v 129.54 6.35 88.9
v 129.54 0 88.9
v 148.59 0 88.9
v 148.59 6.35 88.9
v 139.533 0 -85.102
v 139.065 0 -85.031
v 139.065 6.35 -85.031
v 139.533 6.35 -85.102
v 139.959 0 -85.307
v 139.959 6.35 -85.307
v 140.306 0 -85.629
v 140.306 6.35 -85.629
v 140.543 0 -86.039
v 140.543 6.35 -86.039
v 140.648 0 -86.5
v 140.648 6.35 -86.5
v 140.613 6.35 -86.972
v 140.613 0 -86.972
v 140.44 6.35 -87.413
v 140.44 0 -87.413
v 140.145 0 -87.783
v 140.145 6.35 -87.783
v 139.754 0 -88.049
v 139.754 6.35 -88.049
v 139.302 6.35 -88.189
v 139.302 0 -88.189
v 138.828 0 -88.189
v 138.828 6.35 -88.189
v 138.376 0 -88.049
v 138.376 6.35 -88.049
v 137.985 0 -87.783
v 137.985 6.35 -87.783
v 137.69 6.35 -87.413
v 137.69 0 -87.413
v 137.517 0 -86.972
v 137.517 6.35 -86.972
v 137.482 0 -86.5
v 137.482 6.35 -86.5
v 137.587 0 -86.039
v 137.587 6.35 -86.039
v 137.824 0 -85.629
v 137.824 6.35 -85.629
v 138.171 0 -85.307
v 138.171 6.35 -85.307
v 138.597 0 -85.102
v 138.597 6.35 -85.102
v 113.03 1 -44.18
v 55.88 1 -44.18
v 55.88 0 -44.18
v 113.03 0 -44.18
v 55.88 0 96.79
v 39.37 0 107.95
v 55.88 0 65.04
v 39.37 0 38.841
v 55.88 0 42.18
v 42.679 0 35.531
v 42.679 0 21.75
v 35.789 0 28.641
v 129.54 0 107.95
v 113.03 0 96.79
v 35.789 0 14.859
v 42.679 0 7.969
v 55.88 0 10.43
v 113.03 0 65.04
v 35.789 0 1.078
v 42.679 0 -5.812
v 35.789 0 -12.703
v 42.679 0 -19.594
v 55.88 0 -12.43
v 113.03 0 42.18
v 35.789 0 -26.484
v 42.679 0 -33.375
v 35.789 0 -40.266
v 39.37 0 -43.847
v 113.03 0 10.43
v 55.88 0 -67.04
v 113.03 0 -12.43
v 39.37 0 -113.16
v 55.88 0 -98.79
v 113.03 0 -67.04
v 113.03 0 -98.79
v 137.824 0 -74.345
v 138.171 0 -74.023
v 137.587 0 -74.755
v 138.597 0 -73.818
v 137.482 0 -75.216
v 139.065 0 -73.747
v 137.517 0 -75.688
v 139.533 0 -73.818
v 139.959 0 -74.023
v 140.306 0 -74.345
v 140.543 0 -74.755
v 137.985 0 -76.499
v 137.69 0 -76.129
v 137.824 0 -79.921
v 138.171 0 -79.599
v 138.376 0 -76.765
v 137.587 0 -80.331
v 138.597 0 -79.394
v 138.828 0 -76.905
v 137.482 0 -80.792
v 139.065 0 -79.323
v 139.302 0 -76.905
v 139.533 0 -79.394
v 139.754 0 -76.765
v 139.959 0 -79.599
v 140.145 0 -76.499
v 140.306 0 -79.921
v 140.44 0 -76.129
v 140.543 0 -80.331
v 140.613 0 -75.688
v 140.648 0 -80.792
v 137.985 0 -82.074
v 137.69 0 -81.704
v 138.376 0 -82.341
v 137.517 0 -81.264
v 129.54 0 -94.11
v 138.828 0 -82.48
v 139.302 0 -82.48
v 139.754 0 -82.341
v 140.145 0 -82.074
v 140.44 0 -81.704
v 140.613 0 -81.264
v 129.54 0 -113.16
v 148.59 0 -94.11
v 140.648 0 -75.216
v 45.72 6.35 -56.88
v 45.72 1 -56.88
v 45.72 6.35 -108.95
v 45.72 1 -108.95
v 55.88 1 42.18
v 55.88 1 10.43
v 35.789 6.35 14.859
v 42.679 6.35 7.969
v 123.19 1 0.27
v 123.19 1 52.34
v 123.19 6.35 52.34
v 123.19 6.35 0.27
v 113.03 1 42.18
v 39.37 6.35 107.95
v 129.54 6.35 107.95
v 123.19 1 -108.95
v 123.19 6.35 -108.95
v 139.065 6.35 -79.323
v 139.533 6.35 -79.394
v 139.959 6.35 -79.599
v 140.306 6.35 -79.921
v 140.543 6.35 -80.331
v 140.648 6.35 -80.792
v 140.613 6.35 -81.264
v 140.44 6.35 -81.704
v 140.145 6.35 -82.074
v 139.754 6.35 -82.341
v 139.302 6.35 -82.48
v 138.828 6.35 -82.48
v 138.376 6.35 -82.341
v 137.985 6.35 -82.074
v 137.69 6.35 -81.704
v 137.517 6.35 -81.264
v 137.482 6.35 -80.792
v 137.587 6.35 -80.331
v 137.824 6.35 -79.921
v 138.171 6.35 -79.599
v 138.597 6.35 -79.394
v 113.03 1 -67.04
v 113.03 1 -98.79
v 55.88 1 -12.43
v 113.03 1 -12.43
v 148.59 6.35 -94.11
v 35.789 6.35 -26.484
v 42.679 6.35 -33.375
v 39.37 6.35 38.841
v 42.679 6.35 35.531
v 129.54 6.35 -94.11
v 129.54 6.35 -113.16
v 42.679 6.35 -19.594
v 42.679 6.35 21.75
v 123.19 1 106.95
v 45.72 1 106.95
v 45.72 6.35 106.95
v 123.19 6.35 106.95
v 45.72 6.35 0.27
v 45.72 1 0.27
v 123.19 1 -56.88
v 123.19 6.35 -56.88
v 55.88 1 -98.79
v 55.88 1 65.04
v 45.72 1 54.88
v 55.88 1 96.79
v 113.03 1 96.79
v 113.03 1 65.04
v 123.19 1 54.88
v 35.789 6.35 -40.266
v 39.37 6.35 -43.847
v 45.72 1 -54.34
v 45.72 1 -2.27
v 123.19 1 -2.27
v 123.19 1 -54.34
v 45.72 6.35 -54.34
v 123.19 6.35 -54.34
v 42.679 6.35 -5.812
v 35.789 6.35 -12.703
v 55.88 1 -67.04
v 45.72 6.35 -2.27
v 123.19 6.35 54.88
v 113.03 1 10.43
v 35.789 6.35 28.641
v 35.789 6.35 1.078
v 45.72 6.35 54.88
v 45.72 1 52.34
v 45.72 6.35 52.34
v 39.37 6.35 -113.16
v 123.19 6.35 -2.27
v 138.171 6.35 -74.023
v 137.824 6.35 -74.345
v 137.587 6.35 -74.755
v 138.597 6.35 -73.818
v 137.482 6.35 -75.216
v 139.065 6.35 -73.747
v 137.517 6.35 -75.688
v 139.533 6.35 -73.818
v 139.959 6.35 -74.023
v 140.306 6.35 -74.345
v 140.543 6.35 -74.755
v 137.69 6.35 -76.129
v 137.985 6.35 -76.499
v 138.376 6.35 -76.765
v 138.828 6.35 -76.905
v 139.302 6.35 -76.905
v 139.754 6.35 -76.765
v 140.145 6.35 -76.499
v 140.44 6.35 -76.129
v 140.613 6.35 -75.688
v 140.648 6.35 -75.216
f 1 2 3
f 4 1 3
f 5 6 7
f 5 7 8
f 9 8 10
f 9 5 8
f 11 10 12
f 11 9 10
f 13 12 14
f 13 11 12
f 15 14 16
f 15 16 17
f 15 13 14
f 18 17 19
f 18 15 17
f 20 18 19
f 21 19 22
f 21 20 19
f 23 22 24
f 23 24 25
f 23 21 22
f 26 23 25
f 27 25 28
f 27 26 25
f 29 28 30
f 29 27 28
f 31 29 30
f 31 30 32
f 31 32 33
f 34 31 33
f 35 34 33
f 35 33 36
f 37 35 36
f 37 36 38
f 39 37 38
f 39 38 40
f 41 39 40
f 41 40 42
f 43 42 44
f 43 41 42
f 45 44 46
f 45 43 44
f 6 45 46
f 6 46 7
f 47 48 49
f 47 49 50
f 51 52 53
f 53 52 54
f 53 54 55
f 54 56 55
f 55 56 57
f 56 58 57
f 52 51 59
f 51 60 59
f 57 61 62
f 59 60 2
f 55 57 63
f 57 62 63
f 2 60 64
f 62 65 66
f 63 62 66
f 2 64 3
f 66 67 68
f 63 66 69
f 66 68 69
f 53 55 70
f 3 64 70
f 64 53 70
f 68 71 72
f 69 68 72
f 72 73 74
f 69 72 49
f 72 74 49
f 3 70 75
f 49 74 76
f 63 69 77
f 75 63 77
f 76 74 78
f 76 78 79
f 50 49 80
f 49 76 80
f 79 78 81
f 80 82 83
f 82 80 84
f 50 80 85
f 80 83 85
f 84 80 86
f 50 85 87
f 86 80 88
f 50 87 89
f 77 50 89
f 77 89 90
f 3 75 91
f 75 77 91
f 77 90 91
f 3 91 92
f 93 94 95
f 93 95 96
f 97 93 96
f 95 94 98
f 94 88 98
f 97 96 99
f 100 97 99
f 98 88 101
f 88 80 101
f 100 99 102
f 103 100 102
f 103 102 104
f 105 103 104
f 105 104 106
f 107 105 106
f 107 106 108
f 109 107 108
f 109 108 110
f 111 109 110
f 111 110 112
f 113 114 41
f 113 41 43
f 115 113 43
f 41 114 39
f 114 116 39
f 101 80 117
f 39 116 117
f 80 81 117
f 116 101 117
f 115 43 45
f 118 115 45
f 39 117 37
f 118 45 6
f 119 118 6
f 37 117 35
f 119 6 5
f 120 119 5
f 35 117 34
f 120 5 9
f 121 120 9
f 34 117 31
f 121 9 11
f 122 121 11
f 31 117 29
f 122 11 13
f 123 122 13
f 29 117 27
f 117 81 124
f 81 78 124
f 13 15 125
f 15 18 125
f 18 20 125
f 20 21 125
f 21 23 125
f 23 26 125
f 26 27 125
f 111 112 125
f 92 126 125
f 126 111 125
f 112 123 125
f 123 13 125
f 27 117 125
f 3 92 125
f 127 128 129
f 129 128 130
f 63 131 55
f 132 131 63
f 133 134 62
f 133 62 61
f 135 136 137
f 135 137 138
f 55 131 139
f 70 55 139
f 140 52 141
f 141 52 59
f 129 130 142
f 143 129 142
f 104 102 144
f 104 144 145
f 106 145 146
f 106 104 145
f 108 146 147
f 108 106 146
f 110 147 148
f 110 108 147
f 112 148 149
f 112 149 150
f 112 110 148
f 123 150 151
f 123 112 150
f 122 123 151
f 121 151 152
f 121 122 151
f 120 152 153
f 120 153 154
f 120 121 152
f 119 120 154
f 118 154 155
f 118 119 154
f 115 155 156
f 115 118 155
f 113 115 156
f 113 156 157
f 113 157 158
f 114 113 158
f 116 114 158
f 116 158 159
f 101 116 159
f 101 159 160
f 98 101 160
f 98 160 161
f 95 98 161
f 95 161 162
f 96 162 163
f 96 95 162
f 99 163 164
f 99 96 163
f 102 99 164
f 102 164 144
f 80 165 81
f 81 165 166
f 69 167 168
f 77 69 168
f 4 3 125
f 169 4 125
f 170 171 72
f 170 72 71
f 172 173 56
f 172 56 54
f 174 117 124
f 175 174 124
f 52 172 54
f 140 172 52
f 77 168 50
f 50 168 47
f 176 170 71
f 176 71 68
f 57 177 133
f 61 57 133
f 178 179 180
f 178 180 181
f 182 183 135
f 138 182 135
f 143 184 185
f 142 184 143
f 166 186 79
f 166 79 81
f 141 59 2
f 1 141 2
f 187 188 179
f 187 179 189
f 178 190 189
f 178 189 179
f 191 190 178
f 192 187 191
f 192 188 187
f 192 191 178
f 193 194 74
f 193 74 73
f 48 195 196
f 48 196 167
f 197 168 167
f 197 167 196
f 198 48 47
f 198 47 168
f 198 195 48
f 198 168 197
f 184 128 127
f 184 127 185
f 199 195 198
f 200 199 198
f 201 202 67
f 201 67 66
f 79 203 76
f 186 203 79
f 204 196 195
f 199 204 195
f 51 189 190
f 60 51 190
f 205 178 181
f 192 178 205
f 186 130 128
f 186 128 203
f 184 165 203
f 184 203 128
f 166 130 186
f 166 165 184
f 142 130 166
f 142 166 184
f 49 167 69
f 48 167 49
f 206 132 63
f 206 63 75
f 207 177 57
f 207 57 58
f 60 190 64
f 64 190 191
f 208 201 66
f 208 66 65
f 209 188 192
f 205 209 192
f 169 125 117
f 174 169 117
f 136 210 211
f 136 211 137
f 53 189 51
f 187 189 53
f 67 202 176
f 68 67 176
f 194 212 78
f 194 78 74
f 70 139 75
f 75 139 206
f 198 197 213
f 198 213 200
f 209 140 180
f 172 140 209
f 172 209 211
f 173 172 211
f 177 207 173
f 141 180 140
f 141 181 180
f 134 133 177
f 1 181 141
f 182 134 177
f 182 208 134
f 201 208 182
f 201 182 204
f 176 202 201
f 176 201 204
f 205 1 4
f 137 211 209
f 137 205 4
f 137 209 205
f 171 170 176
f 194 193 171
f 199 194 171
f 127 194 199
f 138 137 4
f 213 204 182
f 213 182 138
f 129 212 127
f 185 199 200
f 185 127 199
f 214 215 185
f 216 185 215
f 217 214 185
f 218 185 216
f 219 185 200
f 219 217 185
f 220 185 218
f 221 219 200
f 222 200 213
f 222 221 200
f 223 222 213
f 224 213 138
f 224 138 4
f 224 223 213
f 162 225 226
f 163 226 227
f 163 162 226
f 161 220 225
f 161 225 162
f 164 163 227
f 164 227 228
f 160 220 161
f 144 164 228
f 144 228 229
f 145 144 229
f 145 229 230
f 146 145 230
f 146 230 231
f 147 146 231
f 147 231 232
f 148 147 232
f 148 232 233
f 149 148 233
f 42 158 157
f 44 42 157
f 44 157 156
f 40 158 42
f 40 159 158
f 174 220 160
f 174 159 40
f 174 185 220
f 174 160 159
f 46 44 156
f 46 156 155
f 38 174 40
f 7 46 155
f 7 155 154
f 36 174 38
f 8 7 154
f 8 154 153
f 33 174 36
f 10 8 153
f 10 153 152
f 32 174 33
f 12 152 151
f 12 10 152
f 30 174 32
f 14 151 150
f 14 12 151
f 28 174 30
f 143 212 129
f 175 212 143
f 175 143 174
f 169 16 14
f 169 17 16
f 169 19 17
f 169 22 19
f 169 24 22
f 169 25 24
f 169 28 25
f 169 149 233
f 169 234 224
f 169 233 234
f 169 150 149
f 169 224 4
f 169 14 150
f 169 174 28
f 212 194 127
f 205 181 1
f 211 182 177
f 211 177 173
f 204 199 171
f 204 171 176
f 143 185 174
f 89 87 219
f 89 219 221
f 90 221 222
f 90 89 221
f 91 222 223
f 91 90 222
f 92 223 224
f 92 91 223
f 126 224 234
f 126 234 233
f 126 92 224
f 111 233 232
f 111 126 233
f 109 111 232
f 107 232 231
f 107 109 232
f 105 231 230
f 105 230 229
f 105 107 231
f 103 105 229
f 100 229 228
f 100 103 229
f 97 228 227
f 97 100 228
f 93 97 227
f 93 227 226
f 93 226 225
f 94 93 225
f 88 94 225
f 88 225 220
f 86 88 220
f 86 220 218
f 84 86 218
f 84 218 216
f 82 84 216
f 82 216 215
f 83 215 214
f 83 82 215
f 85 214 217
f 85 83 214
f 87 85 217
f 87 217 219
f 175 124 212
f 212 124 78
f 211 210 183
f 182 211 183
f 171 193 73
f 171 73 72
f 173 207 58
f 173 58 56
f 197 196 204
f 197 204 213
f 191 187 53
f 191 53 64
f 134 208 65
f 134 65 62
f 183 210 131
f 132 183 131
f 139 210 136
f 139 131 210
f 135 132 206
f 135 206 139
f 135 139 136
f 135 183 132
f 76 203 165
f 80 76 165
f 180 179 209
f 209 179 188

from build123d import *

# Parameters (mm, degrees)
SKETCH1_W           = 77.47
SKETCH1_H           = 52.07
SKETCH1_R           = 1.5875
SKETCH1_H_2         = 52.34
BOSS_EXTRUDE3_DEPTH = 6.35
SKETCH2_W           = 19.05
SKETCH2_H           = 1
CUT_EXTRUDE1_DEPTH  = 193.995155978
SKETCH4_W           = 19.05
SKETCH4_H           = 1
CUT_EXTRUDE2_DEPTH  = 193.995155978
SKETCH5_W           = 257.81
SKETCH5_H           = 1
BOSS_EXTRUDE4_DEPTH = 215.9
SKETCH6_W           = 57.15
SKETCH6_H           = 31.75
CUT_EXTRUDE3_DEPTH  = 193.964841955
CUT_EXTRUDE5_DEPTH  = 193.995155978


with BuildPart() as part:
    # Sketch1 → Boss-Extrude3 (new body)
    with BuildSketch(Plane(origin=(0, 0, 0), x_dir=(1, 0, 0), z_dir=(0, 1, 0))):
        Polygon((148.59, 94.11025641), (129.54, 94.11025641), (129.54, 113.16025641), (-137.02974359, 113.16025641), (-137.02974359, 93.98), (-156.21, 93.98), (-156.21, -88.9), (-137.16, -88.9), (-137.16, -106.95), (-156.21, -106.95), (-156.21, -107.95), (148.59, -107.95), (148.59, -106.95), (129.54, -106.95), (129.54, -88.9), (148.59, -88.9), align=None)
        with Locations((-95.885, -80.915)):
            Rectangle(SKETCH1_W, SKETCH1_H, mode=Mode.SUBTRACT)
        with Locations((-5.715, -80.915)):
            Rectangle(SKETCH1_W, SKETCH1_H, mode=Mode.SUBTRACT)
        with Locations((84.455, -80.915)):
            Rectangle(SKETCH1_W, SKETCH1_H, mode=Mode.SUBTRACT)
        with Locations((84.455, 82.915)):
            Rectangle(SKETCH1_W, SKETCH1_H, mode=Mode.SUBTRACT)
        with Locations((84.455, 28.305)):
            Rectangle(SKETCH1_W, SKETCH1_H, mode=Mode.SUBTRACT)
        with Locations((84.455, -26.305)):
            Rectangle(SKETCH1_W, SKETCH1_H, mode=Mode.SUBTRACT)
        with Locations(Location((139.065, 75.334869264, 0), (0, 0, 270))):
            Circle(SKETCH1_R, mode=Mode.SUBTRACT)
        with Locations(Location((139.065, 80.910552749, 0), (0, 0, 270))):
            Circle(SKETCH1_R, mode=Mode.SUBTRACT)
        with Locations(Location((139.065, 86.618990604, 0), (0, 0, 270))):
            Circle(SKETCH1_R, mode=Mode.SUBTRACT)
        with Locations((-5.715, 82.915)):
            Rectangle(SKETCH1_W, SKETCH1_H, mode=Mode.SUBTRACT)
        with Locations((-95.885, -26.305)):
            Rectangle(SKETCH1_W, SKETCH1_H, mode=Mode.SUBTRACT)
        with Locations((-5.715, -26.17)):
            Rectangle(SKETCH1_W, SKETCH1_H_2, mode=Mode.SUBTRACT)
        with Locations((-95.885, 28.305)):
            Rectangle(SKETCH1_W, SKETCH1_H, mode=Mode.SUBTRACT)
        with Locations((-5.715, 28.305)):
            Rectangle(SKETCH1_W, SKETCH1_H, mode=Mode.SUBTRACT)
        with Locations((-95.885, 82.915)):
            Rectangle(SKETCH1_W, SKETCH1_H, mode=Mode.SUBTRACT)
    extrude(amount=BOSS_EXTRUDE3_DEPTH)

    # Sketch2 → Cut-Extrude1 (cut, through all)
    with BuildSketch(Plane(origin=(0, 6.35, 0), x_dir=(1, 0, 0), z_dir=(0, 1, 0))):
        with Locations((139.065, -107.45)):
            Rectangle(SKETCH2_W, SKETCH2_H)
    extrude(amount=-CUT_EXTRUDE1_DEPTH, mode=Mode.SUBTRACT)

    # Sketch4 → Cut-Extrude2 (cut, through all)
    with BuildSketch(Plane(origin=(0, 6.35, 0), x_dir=(1, 0, 0), z_dir=(0, 1, 0))):
        with Locations((-146.685, -107.45)):
            Rectangle(SKETCH4_W, SKETCH4_H)
    extrude(amount=-CUT_EXTRUDE2_DEPTH, mode=Mode.SUBTRACT)

    # Sketch5 → Boss-Extrude4 (add)
    with BuildSketch(Plane.XY.offset(-108.95)):
        with Locations((-5.715, 0.5)):
            Rectangle(SKETCH5_W, SKETCH5_H)
    extrude(amount=BOSS_EXTRUDE4_DEPTH)

    # Sketch6 → Cut-Extrude3 (cut, through all)
    with BuildSketch(Plane(origin=(0, 1, 0), x_dir=(1, 0, 0), z_dir=(0, 1, 0))):
        with Locations((-95.885, 82.915)):
            Rectangle(SKETCH6_W, SKETCH6_H)
        with Locations((-95.885, 28.305)):
            Rectangle(SKETCH6_W, SKETCH6_H)
        with Locations((-95.885, -26.305)):
            Rectangle(SKETCH6_W, SKETCH6_H)
        with Locations((-95.885, -80.915)):
            Rectangle(SKETCH6_W, SKETCH6_H)
        with Locations((-5.715, 82.915)):
            Rectangle(SKETCH6_W, SKETCH6_H)
        with Locations((84.455, 82.915)):
            Rectangle(SKETCH6_W, SKETCH6_H)
        with Locations((-5.715, 28.305)):
            Rectangle(SKETCH6_W, SKETCH6_H)
        with Locations((-5.715, -26.305)):
            Rectangle(SKETCH6_W, SKETCH6_H)
        with Locations((-5.715, -80.915)):
            Rectangle(SKETCH6_W, SKETCH6_H)
        with Locations((84.455, -80.915)):
            Rectangle(SKETCH6_W, SKETCH6_H)
        with Locations((84.455, -26.305)):
            Rectangle(SKETCH6_W, SKETCH6_H)
        with Locations((84.455, 28.305)):
            Rectangle(SKETCH6_W, SKETCH6_H)
    extrude(amount=-CUT_EXTRUDE3_DEPTH, mode=Mode.SUBTRACT)

    # Sketch7 → Cut-Extrude5 (cut, through all)
    with BuildSketch(Plane(origin=(0, 6.35, 0), x_dir=(1, 0, 0), z_dir=(0, 1, 0))):
        Polygon((39.37, 43.846772262), (35.788770068, 40.26554233), (42.679389728, 33.37492267), (35.788770068, 26.48430301), (42.679389728, 19.593683351), (39.37, 16.284293623), (35.788770068, 12.703063691), (42.679389728, 5.812444031), (35.788770068, -1.078175628), (42.679389728, -7.968795288), (35.788770068, -14.859414948), (39.37, -18.44064488), (42.679389728, -21.750034608), (35.788770068, -28.640654267), (42.679389728, -35.531273927), (39.37, -38.840663655), (39.37, -107.95), (-160.951266418, -107.95), (-160.951266418, 113.16025641), (39.37, 113.16025641), align=None)
    extrude(amount=-CUT_EXTRUDE5_DEPTH, mode=Mode.SUBTRACT)


solid = part.part
